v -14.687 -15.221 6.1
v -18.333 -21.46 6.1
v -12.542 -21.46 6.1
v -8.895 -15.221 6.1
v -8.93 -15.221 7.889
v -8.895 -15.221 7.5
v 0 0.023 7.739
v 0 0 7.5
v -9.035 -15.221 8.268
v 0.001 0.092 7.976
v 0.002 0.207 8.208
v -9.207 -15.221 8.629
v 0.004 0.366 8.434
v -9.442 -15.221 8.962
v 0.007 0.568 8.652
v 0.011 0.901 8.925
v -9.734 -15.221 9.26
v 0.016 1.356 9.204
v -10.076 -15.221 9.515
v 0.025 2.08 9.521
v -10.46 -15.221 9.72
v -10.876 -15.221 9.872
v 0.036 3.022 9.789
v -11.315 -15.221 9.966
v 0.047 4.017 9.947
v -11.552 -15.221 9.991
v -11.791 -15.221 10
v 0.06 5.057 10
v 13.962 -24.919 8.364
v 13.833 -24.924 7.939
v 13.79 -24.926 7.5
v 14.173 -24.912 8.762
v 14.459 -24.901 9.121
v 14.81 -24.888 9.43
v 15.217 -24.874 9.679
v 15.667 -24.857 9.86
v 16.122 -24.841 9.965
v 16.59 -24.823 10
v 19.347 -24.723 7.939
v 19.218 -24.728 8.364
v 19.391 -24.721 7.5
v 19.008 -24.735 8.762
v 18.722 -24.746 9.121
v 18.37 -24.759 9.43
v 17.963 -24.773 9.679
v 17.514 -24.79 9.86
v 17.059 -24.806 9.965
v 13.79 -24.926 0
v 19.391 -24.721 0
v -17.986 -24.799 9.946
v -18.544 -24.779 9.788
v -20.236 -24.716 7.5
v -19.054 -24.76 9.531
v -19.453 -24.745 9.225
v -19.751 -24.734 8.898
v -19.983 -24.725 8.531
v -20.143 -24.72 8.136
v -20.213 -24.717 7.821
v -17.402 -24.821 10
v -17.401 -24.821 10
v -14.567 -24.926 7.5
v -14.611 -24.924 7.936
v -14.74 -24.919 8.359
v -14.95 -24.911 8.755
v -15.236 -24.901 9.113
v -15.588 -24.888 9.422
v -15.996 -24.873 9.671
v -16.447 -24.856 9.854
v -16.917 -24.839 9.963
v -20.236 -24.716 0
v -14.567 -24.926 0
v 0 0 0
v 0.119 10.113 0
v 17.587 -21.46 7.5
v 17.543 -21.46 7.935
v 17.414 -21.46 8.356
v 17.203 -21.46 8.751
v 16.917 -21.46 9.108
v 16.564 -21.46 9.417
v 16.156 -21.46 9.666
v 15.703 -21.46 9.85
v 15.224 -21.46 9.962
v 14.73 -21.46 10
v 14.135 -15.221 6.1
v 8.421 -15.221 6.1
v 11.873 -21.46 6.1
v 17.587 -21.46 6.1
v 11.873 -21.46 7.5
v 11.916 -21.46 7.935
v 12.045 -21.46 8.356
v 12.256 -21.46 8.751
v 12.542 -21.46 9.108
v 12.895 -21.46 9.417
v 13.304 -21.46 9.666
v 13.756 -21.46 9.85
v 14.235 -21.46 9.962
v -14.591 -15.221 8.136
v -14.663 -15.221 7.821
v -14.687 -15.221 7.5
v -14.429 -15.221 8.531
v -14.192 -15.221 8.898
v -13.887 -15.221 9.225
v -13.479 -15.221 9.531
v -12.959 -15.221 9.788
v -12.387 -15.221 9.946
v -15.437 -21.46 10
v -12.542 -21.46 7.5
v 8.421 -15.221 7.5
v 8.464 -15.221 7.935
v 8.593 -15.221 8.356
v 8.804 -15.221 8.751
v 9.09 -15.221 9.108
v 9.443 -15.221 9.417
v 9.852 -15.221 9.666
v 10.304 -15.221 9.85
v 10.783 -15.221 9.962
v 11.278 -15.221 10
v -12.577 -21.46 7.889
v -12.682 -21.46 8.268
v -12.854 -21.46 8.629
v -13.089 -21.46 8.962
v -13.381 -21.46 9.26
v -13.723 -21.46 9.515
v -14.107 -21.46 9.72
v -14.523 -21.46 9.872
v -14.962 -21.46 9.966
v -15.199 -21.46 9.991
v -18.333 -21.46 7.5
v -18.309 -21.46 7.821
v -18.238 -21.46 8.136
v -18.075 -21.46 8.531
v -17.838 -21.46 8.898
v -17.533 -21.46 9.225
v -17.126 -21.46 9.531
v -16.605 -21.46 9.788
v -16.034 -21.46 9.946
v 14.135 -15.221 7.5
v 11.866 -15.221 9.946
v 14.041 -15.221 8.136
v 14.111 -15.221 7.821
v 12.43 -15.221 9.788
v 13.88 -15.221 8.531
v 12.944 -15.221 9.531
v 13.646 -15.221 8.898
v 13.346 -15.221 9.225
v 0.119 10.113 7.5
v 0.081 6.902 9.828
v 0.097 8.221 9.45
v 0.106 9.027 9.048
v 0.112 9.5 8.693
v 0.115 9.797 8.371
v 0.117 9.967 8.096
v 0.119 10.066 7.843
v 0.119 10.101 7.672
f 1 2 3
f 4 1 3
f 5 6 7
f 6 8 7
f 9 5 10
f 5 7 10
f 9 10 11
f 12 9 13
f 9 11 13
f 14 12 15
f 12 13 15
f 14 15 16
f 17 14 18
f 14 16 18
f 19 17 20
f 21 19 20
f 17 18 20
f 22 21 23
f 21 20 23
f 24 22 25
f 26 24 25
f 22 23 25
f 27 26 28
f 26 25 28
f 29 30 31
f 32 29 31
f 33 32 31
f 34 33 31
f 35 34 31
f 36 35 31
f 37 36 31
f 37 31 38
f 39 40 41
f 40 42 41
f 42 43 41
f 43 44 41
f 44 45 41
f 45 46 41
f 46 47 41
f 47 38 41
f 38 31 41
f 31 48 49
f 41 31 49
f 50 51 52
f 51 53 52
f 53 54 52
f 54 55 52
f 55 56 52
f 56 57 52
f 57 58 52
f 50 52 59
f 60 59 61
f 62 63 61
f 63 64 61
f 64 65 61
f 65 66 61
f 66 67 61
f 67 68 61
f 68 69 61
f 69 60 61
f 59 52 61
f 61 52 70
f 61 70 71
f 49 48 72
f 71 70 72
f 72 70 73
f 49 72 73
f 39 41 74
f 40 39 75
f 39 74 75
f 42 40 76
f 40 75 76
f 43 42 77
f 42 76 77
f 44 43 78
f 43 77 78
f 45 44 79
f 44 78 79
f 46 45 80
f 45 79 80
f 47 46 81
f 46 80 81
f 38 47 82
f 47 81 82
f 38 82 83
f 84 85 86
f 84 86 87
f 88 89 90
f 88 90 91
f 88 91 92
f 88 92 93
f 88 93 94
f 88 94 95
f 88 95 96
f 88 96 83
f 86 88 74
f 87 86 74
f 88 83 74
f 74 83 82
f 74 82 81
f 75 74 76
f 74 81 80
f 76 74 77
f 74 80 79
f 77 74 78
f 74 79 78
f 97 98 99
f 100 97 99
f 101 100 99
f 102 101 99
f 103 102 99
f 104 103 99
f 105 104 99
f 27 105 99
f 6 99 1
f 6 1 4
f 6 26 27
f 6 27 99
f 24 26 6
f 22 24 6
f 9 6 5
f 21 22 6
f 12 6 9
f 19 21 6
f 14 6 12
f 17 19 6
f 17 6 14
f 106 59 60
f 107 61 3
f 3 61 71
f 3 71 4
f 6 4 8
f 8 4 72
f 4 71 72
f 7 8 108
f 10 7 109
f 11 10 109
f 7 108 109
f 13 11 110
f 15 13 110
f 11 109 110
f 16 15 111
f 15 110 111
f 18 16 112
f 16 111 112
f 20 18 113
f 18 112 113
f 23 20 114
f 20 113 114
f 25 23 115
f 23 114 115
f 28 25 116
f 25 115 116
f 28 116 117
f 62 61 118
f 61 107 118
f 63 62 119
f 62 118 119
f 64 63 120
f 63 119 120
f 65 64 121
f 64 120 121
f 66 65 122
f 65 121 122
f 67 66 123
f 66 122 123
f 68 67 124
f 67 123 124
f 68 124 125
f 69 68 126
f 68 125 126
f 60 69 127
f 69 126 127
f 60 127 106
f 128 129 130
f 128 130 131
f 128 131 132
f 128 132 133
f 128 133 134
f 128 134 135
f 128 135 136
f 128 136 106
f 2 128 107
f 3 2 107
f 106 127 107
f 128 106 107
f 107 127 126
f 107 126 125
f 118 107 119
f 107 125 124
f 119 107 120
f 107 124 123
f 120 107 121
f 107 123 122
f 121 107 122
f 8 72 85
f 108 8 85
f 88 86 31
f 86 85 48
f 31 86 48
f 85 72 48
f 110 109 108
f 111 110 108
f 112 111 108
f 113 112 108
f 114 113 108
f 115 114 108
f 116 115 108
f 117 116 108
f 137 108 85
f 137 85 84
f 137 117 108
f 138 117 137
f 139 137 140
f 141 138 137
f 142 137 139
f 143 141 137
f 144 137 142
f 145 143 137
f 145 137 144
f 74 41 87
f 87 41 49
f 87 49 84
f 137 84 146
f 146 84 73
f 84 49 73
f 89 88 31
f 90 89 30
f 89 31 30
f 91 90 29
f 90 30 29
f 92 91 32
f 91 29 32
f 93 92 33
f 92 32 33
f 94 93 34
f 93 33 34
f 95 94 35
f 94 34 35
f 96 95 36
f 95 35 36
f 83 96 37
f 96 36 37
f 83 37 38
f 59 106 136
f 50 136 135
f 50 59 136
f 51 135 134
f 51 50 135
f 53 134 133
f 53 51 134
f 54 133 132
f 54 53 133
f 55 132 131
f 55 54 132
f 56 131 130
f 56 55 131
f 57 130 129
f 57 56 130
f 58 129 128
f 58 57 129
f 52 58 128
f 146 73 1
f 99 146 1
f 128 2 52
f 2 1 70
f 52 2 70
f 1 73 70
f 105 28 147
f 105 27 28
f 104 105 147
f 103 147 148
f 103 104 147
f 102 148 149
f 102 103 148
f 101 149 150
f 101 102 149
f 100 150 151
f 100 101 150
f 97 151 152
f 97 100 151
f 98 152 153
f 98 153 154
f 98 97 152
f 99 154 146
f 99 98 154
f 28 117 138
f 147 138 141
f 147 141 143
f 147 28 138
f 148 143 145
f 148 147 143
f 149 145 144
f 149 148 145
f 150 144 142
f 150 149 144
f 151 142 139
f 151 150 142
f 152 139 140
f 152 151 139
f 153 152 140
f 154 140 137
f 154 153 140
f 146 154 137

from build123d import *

# Parameters (mm, degrees)
F1_DEPTH = 10
F2_W     = 48.9705931395
F2_H     = 6.2394971028
F3_DEPTH = 3.9
F4_R     = 2.49999


# Not quite as in the source:
# - a fillet or chamfer is up to 0.001 mm smaller than in the source, because OpenCascade refuses the exact size


with BuildPart() as f1:
    # F0 (on Top) → F1 (new body)
    with BuildSketch(Plane.XY):
        Polygon((-14.5670969574, -24.9256566167), (0, 0), (13.7898046523, -24.9256566167), (19.3909112023, -24.7212815966), (0.1191440202, 10.1132547357), (-20.2359139567, -24.7161410615), align=None)
    extrude(amount=F1_DEPTH)

    # F2 (on face) → F3 (cut)
    with BuildSketch(Plane.XY.offset(10)):
        with Locations((2.1743709221, -18.3403375559)):
            Rectangle(F2_W, F2_H)
    extrude(amount=-F3_DEPTH, mode=Mode.SUBTRACT)

    # F4 (radius 2.5 in the source; OpenCascade refuses exactly that, so slightly less here)
    f4_edges = [f1.edges().sort_by_distance(p)[0] for p in [
        (-7.283681, -2.553667, 10),
        (7.126959, -2.553667, 10),
        (-4.447622, -7.610295, 10),
        (4.210299, -7.610295, 10),
        (-19.284459, -23.088114, 10),
        (-13.554419, -23.192871, 10),
        (12.831163, -23.192871, 10),
        (18.488804, -23.090684, 10),
    ]]
    fillet(f4_edges, radius=F4_R)


solid = f1.part
